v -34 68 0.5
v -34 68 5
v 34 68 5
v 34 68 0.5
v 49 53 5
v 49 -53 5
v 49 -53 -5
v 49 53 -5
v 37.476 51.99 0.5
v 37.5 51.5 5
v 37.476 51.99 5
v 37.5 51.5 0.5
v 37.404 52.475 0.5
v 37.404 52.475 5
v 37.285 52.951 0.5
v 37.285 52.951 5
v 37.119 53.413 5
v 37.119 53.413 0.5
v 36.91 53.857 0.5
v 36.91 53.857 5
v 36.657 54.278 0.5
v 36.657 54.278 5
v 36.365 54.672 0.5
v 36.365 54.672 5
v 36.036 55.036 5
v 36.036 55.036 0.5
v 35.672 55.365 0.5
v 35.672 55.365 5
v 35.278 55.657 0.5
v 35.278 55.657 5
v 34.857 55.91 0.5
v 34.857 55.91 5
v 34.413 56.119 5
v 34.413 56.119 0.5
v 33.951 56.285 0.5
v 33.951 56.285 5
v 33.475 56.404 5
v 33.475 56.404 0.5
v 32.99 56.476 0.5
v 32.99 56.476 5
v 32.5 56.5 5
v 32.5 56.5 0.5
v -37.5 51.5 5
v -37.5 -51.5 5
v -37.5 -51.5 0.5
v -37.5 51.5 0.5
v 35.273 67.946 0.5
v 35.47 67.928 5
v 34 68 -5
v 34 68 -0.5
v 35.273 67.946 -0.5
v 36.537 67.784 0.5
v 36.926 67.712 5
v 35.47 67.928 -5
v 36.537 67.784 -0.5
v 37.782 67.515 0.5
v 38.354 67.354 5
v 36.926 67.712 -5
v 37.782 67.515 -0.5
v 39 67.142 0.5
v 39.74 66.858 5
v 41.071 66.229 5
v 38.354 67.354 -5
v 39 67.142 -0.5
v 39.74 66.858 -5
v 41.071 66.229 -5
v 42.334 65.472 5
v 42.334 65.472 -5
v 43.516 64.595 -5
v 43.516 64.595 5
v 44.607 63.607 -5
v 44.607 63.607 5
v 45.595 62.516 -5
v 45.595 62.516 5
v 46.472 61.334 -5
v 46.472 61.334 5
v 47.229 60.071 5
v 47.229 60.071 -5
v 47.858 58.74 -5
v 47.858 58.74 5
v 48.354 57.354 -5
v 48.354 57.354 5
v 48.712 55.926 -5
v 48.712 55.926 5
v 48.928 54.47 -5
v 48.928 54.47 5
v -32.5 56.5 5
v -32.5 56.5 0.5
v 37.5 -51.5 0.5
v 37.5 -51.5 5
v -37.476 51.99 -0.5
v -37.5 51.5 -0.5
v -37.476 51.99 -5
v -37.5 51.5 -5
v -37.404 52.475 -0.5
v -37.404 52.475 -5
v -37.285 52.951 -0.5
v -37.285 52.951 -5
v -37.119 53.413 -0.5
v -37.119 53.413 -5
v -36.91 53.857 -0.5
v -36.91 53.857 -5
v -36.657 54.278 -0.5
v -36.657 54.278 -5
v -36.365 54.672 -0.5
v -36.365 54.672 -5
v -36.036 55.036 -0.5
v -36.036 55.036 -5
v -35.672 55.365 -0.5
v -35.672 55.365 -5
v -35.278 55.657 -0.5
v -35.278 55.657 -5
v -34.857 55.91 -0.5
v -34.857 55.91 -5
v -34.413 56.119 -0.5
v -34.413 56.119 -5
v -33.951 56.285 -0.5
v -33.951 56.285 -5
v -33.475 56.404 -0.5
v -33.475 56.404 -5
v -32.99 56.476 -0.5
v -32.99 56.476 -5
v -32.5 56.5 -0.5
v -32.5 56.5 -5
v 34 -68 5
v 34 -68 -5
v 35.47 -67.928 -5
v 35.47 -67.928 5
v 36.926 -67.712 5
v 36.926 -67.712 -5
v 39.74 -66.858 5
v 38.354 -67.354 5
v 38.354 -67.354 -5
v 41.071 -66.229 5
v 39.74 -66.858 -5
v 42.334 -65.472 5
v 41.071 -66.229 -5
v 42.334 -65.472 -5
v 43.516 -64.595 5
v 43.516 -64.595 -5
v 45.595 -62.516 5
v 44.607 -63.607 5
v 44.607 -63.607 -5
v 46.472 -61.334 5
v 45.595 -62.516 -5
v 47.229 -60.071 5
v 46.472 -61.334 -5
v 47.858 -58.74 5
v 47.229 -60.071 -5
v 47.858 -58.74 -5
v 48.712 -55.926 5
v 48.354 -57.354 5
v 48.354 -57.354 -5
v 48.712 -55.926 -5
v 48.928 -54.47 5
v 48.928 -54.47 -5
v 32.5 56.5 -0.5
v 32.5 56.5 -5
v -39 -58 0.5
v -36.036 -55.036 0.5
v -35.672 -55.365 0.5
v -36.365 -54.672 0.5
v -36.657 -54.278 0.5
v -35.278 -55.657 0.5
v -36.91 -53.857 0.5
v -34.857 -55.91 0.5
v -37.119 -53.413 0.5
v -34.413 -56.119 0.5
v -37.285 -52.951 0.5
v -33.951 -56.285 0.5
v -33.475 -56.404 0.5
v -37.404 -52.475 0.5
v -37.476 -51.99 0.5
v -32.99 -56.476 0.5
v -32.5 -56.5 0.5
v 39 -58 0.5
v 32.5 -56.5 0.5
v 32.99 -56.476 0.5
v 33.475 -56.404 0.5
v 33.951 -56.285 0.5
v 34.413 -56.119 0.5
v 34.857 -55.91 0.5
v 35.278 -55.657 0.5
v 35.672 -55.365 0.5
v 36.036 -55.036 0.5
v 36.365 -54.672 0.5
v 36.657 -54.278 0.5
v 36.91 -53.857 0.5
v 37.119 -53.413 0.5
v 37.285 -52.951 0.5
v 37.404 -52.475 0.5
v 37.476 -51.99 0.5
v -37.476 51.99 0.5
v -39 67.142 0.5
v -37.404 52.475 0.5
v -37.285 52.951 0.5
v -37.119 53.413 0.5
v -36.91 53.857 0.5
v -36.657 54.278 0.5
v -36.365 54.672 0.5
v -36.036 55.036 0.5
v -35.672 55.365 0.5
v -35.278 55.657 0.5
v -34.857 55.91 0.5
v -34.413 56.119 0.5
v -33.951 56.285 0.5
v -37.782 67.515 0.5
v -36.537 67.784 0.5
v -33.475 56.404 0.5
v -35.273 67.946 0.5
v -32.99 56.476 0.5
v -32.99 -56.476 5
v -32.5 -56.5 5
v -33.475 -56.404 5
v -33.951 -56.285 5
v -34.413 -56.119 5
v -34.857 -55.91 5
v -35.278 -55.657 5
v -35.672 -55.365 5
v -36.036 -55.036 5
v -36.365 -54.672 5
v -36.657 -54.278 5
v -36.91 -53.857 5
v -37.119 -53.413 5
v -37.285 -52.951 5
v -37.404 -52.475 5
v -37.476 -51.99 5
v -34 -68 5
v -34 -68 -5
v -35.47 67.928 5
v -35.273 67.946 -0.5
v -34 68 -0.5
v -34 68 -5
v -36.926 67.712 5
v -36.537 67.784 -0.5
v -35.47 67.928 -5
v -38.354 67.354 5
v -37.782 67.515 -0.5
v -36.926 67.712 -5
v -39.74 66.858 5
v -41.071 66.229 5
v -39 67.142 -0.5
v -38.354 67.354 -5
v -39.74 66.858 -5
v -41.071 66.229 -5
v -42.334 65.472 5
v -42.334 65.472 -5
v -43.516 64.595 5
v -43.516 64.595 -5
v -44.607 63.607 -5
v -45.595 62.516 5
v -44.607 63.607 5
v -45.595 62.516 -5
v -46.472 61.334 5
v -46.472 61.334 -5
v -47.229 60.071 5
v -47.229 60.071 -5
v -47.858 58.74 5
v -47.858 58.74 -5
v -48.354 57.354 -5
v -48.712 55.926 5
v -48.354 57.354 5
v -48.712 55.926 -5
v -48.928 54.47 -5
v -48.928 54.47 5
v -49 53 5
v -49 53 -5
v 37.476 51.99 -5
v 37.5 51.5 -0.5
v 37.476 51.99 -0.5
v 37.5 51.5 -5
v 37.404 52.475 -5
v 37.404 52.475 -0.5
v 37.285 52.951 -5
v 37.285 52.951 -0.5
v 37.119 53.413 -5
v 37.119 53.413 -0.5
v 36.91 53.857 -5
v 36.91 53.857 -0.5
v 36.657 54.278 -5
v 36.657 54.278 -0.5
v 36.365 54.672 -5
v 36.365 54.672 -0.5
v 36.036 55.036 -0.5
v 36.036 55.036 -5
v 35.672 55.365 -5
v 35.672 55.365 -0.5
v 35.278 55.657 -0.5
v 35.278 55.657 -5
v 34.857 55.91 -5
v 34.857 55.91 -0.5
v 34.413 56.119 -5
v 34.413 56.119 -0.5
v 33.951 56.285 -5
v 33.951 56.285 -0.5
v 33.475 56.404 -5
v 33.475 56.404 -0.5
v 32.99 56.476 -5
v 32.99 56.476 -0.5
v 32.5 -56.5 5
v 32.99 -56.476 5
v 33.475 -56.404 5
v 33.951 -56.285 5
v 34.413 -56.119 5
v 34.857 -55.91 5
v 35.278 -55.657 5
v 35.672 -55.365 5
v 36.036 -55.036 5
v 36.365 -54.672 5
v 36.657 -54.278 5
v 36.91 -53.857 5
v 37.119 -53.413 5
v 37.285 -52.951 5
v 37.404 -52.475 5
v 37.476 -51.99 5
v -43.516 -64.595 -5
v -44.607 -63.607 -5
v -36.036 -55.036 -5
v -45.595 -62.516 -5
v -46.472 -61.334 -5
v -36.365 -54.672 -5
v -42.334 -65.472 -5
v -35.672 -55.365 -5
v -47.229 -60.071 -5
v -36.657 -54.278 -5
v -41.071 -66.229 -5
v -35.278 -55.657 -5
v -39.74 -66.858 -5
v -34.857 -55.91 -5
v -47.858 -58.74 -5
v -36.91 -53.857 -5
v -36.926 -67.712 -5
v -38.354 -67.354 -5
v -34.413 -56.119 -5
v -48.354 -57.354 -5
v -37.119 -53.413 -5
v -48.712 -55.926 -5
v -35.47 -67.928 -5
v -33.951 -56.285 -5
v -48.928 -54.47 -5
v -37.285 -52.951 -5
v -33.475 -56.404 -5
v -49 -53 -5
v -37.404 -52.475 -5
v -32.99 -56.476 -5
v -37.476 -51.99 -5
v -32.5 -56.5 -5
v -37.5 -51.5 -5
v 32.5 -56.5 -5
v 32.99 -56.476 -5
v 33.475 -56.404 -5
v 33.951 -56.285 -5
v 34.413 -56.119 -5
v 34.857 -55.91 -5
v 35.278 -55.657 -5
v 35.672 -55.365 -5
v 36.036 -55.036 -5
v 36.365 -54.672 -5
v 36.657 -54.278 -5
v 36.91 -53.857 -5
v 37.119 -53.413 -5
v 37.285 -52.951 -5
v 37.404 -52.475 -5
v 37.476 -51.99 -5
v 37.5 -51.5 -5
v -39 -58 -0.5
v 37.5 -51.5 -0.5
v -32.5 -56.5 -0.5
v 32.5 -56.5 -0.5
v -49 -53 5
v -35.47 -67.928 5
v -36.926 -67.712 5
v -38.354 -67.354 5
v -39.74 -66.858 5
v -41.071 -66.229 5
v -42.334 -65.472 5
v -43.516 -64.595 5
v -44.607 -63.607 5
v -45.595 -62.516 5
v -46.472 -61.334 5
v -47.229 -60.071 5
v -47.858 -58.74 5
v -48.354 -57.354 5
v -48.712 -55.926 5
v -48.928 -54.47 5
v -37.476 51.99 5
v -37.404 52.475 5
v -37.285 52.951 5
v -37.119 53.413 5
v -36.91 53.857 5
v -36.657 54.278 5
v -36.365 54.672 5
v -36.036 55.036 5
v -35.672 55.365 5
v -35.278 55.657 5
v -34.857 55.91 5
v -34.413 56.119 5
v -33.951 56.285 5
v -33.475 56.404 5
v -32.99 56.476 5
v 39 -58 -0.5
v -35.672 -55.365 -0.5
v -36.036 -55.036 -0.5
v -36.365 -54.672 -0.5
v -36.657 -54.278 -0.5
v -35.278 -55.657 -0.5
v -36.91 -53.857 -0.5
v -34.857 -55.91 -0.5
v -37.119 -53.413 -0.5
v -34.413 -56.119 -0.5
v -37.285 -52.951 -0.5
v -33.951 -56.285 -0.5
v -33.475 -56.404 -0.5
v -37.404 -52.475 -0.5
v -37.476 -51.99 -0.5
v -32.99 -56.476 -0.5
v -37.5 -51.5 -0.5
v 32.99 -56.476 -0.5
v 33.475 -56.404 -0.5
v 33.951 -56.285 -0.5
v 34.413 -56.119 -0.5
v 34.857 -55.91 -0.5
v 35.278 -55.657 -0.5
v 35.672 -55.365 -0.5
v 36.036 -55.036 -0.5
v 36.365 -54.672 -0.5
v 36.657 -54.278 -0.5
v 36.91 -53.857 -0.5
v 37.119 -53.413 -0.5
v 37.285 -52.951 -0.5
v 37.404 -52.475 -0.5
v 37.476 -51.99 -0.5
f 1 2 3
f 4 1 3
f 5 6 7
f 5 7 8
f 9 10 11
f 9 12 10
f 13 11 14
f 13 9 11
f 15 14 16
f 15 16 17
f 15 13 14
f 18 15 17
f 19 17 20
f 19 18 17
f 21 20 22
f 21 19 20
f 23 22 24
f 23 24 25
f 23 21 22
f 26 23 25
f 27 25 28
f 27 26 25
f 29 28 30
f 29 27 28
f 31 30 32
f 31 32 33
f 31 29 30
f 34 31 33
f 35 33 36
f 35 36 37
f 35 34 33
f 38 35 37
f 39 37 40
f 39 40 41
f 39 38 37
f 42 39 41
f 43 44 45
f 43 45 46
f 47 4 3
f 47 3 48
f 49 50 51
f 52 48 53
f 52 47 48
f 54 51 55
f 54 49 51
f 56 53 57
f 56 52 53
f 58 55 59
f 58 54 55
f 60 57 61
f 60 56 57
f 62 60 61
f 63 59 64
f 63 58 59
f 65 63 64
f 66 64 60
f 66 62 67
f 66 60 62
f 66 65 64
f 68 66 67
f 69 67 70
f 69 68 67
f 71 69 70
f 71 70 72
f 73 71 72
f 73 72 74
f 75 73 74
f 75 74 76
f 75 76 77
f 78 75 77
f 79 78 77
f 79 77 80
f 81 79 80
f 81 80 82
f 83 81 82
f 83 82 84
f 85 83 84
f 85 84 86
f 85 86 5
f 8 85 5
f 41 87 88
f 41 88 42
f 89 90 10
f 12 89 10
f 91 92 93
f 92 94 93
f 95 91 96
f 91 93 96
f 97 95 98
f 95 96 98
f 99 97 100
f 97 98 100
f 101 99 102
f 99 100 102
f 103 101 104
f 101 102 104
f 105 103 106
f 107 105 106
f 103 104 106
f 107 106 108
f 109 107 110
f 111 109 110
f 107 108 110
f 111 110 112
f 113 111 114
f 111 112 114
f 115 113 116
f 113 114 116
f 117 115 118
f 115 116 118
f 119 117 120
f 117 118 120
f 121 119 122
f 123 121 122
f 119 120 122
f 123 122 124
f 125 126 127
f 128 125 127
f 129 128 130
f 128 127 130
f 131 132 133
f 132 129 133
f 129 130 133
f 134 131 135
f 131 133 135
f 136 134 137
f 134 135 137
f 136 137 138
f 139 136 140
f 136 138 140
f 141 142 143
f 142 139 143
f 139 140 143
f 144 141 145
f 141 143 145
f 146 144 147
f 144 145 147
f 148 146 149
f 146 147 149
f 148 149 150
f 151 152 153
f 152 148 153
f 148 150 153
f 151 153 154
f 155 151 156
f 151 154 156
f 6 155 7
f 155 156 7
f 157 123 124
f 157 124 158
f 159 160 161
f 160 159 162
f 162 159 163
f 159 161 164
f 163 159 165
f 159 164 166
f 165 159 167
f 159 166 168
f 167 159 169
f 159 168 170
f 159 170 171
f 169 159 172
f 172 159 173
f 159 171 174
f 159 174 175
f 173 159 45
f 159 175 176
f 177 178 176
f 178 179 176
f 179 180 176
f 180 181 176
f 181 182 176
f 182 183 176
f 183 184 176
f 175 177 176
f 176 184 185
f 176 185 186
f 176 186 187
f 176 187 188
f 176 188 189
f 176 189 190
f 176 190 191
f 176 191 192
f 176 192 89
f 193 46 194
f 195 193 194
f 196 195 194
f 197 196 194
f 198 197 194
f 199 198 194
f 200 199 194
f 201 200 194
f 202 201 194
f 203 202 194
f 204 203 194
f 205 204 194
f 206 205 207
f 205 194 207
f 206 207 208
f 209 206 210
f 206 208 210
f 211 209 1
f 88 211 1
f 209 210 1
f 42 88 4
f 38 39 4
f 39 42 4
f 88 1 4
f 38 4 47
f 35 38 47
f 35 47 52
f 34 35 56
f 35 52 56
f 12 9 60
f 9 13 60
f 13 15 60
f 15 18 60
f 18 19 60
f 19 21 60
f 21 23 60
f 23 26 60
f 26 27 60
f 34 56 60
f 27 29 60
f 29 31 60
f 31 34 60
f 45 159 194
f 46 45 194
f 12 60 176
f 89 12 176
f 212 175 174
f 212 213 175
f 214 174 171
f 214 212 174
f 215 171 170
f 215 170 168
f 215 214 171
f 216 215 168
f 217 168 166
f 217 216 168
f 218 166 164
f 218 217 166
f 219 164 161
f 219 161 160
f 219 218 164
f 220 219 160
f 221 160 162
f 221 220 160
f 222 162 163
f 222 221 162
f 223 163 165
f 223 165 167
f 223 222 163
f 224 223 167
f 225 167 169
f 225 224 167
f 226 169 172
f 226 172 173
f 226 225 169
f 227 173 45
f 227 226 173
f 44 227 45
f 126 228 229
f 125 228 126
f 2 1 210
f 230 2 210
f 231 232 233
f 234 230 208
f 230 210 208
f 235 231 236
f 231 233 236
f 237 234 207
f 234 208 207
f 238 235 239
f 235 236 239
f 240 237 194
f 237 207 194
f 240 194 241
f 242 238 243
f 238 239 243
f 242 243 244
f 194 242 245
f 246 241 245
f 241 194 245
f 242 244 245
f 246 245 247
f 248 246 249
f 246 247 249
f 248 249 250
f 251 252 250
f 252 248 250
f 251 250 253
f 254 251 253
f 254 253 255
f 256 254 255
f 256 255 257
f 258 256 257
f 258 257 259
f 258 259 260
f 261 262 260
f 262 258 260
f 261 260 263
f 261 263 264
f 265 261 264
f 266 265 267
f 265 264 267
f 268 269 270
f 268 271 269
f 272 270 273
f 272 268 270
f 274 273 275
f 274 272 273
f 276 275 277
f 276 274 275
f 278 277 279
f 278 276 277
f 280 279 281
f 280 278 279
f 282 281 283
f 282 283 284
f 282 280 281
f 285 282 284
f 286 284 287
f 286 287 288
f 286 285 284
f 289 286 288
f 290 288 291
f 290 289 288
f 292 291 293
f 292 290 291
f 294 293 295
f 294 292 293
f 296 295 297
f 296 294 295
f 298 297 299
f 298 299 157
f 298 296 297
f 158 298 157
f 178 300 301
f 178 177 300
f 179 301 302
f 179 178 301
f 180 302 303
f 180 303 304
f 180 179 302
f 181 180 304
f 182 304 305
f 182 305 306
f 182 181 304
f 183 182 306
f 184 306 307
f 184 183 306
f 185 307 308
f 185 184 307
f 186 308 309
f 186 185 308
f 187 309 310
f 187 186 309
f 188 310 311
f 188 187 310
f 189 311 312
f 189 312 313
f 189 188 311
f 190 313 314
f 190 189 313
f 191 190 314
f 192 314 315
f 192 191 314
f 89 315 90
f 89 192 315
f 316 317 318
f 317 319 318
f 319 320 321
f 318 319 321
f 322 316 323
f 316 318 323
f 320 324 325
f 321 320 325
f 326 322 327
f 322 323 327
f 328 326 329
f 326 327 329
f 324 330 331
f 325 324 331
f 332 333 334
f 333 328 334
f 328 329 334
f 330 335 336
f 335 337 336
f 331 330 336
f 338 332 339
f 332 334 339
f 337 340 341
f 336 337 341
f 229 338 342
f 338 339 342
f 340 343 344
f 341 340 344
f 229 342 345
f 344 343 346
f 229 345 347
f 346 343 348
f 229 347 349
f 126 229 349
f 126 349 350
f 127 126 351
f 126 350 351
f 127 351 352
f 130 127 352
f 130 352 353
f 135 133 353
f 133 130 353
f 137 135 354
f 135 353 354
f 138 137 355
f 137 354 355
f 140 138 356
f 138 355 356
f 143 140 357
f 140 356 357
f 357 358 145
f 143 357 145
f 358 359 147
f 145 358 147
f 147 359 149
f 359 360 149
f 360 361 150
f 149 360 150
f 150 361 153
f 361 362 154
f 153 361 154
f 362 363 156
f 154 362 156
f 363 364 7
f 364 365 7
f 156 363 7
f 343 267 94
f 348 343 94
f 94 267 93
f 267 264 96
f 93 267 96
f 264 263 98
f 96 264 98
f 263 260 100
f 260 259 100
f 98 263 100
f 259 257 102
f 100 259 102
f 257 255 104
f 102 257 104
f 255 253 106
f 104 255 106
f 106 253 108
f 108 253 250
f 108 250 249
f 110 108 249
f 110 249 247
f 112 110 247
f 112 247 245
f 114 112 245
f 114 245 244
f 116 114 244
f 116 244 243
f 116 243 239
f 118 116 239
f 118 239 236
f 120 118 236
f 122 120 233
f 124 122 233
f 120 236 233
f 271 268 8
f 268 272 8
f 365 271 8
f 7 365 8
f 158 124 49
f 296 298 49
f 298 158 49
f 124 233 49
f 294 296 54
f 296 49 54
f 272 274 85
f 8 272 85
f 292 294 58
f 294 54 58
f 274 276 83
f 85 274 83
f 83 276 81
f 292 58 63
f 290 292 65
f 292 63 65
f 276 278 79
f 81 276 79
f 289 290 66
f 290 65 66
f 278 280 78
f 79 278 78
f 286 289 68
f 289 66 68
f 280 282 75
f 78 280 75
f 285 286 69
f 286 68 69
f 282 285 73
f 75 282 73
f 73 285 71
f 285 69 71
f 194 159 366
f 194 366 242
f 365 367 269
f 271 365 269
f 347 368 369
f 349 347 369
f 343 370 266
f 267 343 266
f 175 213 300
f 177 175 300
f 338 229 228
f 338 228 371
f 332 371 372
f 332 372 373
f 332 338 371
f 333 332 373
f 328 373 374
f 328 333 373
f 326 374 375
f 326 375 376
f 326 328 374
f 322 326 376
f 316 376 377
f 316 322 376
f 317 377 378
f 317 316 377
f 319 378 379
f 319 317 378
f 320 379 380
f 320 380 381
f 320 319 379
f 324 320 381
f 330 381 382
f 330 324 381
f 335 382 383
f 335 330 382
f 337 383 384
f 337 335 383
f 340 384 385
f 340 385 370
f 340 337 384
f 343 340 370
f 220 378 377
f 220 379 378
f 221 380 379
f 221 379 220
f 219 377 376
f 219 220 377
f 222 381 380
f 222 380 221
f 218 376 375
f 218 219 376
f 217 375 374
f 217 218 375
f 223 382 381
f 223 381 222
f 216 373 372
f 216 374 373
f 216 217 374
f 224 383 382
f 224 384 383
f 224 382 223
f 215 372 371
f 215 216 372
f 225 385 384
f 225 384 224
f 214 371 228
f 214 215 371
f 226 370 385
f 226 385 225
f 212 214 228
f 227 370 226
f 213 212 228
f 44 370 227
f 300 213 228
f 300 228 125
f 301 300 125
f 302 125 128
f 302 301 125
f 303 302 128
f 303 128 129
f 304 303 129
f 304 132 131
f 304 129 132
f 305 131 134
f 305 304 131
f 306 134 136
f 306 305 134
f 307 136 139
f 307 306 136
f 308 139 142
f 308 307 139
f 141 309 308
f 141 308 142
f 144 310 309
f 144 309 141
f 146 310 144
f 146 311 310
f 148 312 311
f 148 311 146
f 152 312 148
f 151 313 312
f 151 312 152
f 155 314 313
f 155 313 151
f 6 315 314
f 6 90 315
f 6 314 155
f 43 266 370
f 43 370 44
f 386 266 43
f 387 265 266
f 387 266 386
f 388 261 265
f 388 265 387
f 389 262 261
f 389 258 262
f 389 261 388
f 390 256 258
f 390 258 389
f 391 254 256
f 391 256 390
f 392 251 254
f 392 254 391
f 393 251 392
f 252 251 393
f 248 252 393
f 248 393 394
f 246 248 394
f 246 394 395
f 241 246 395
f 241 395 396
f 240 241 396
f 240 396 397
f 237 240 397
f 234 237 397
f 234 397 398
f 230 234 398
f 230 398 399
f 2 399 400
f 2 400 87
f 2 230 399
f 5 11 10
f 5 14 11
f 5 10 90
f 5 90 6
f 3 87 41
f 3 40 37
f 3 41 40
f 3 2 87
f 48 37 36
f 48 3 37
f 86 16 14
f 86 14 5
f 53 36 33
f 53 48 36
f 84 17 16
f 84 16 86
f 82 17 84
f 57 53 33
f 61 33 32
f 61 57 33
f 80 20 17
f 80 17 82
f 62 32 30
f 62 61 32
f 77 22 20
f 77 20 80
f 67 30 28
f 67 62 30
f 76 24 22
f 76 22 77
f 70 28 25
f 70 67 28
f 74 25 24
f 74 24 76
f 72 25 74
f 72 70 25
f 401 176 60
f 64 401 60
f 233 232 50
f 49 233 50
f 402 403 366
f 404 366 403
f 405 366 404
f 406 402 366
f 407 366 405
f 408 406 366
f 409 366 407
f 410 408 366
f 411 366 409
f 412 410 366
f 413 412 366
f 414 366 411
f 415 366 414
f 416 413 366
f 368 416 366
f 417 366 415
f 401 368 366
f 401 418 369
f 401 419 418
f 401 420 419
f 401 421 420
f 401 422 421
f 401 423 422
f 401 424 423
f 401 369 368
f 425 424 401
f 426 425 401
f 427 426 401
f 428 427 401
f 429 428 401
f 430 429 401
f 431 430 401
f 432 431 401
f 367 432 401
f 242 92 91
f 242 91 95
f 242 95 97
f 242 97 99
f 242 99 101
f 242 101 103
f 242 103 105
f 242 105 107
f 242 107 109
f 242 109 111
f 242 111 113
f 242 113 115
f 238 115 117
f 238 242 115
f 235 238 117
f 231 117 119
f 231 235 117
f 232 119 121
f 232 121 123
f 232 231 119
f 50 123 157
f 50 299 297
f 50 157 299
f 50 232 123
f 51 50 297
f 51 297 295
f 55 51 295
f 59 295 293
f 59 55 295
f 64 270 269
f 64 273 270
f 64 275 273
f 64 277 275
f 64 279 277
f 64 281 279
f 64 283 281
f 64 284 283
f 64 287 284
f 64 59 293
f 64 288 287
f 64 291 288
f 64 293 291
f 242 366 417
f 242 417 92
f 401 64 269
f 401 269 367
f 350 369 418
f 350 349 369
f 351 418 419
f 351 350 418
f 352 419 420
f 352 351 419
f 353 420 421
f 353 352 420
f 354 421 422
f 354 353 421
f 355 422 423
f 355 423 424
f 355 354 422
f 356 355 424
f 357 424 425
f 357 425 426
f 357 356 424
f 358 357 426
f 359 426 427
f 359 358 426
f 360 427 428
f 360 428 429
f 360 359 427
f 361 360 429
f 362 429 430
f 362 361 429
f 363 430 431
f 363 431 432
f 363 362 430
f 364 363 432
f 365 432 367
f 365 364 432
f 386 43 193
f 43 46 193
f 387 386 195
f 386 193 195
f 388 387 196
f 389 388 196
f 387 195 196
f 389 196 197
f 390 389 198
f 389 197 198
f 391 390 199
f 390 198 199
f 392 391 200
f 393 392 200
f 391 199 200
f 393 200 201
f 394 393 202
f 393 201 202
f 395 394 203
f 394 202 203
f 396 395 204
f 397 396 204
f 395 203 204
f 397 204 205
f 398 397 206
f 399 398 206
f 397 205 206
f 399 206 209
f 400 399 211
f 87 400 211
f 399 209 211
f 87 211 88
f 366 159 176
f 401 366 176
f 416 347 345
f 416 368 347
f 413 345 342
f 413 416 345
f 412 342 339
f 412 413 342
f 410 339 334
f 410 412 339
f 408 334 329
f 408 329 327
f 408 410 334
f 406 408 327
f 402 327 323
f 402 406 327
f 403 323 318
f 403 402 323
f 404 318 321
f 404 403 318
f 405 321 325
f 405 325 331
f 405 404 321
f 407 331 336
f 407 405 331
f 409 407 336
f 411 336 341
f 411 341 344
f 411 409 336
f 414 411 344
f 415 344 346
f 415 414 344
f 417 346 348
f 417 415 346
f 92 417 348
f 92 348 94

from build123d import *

# Parameters (mm, degrees)
F0_W        = 98
F0_H        = 136
F0_W_2      = 78
F0_H_2      = 116
F0_W_3      = 75
F0_H_3      = 113
F1_DEPTH    = 5
F2_W        = 78
F2_H        = 130
F3_DEPTH    = 0.5
F5_T1_DEPTH = 85
F6_R        = 5


# Not quite as in the source:
# - a fillet or chamfer that OpenCascade refuses, or shapes differently, is made with other operations: its cross-section is extruded or revolved along the edge and cut away or added
# - a feature of the source that left no trace in its solid (it failed there, or was rolled back) is left out


with BuildPart() as f1:
    # F0 (on Top) → F1 (new body, symmetric)
    with BuildSketch(Plane.XY):
        Rectangle(F0_W, F0_H)
        Rectangle(F0_W_2, F0_H_2, mode=Mode.SUBTRACT)
        Rectangle(F0_W_2, F0_H_2)
        Rectangle(F0_W_3, F0_H_3, mode=Mode.SUBTRACT)
    extrude(amount=F1_DEPTH, both=True)

    # F2 (on Top) → F3 (cut, symmetric)
    with BuildSketch(Plane.XY):
        with Locations((0, 7)):
            Rectangle(F2_W, F2_H)
    extrude(amount=F3_DEPTH, both=True, mode=Mode.SUBTRACT)

    # F5: fillet of radius 15 on 4 edges, made by hand

    # F5_s2 → F5_t1 (cut)
    with BuildSketch(Plane.XY.offset(-42.5)):
        with BuildLine():
            ThreePointArc((-34, -68), (-44.6066017178, -63.6066017178), (-49, -53))
            Line((-49, -53), (-49, -68))
            Line((-49, -68), (-34, -68))
        make_face()
        with BuildLine():
            ThreePointArc((34, -68), (44.6066017178, -63.6066017178), (49, -53))
            Line((49, -53), (49, -68))
            Line((49, -68), (34, -68))
        make_face()
        with BuildLine():
            ThreePointArc((34, 68), (44.6066017178, 63.6066017178), (49, 53))
            Line((49, 53), (49, 68))
            Line((49, 68), (34, 68))
        make_face()
        with BuildLine():
            ThreePointArc((-34, 68), (-44.6066017178, 63.6066017178), (-49, 53))
            Line((-49, 53), (-49, 68))
            Line((-49, 68), (-34, 68))
        make_face()
    extrude(amount=F5_T1_DEPTH, mode=Mode.SUBTRACT)

    # F6
    f6_edges = [f1.edges().sort_by_distance(p)[0] for p in [
        (37.5, -56.5, -2.75),
        (37.5, -56.5, 2.75),
        (-37.5, -56.5, 2.75),
        (-37.5, -56.5, -2.75),
        (-37.5, 56.5, 2.75),
        (-37.5, 56.5, -2.75),
        (37.5, 56.5, -2.75),
        (37.5, 56.5, 2.75),
    ]]
    fillet(f6_edges, radius=F6_R)


solid = f1.part
